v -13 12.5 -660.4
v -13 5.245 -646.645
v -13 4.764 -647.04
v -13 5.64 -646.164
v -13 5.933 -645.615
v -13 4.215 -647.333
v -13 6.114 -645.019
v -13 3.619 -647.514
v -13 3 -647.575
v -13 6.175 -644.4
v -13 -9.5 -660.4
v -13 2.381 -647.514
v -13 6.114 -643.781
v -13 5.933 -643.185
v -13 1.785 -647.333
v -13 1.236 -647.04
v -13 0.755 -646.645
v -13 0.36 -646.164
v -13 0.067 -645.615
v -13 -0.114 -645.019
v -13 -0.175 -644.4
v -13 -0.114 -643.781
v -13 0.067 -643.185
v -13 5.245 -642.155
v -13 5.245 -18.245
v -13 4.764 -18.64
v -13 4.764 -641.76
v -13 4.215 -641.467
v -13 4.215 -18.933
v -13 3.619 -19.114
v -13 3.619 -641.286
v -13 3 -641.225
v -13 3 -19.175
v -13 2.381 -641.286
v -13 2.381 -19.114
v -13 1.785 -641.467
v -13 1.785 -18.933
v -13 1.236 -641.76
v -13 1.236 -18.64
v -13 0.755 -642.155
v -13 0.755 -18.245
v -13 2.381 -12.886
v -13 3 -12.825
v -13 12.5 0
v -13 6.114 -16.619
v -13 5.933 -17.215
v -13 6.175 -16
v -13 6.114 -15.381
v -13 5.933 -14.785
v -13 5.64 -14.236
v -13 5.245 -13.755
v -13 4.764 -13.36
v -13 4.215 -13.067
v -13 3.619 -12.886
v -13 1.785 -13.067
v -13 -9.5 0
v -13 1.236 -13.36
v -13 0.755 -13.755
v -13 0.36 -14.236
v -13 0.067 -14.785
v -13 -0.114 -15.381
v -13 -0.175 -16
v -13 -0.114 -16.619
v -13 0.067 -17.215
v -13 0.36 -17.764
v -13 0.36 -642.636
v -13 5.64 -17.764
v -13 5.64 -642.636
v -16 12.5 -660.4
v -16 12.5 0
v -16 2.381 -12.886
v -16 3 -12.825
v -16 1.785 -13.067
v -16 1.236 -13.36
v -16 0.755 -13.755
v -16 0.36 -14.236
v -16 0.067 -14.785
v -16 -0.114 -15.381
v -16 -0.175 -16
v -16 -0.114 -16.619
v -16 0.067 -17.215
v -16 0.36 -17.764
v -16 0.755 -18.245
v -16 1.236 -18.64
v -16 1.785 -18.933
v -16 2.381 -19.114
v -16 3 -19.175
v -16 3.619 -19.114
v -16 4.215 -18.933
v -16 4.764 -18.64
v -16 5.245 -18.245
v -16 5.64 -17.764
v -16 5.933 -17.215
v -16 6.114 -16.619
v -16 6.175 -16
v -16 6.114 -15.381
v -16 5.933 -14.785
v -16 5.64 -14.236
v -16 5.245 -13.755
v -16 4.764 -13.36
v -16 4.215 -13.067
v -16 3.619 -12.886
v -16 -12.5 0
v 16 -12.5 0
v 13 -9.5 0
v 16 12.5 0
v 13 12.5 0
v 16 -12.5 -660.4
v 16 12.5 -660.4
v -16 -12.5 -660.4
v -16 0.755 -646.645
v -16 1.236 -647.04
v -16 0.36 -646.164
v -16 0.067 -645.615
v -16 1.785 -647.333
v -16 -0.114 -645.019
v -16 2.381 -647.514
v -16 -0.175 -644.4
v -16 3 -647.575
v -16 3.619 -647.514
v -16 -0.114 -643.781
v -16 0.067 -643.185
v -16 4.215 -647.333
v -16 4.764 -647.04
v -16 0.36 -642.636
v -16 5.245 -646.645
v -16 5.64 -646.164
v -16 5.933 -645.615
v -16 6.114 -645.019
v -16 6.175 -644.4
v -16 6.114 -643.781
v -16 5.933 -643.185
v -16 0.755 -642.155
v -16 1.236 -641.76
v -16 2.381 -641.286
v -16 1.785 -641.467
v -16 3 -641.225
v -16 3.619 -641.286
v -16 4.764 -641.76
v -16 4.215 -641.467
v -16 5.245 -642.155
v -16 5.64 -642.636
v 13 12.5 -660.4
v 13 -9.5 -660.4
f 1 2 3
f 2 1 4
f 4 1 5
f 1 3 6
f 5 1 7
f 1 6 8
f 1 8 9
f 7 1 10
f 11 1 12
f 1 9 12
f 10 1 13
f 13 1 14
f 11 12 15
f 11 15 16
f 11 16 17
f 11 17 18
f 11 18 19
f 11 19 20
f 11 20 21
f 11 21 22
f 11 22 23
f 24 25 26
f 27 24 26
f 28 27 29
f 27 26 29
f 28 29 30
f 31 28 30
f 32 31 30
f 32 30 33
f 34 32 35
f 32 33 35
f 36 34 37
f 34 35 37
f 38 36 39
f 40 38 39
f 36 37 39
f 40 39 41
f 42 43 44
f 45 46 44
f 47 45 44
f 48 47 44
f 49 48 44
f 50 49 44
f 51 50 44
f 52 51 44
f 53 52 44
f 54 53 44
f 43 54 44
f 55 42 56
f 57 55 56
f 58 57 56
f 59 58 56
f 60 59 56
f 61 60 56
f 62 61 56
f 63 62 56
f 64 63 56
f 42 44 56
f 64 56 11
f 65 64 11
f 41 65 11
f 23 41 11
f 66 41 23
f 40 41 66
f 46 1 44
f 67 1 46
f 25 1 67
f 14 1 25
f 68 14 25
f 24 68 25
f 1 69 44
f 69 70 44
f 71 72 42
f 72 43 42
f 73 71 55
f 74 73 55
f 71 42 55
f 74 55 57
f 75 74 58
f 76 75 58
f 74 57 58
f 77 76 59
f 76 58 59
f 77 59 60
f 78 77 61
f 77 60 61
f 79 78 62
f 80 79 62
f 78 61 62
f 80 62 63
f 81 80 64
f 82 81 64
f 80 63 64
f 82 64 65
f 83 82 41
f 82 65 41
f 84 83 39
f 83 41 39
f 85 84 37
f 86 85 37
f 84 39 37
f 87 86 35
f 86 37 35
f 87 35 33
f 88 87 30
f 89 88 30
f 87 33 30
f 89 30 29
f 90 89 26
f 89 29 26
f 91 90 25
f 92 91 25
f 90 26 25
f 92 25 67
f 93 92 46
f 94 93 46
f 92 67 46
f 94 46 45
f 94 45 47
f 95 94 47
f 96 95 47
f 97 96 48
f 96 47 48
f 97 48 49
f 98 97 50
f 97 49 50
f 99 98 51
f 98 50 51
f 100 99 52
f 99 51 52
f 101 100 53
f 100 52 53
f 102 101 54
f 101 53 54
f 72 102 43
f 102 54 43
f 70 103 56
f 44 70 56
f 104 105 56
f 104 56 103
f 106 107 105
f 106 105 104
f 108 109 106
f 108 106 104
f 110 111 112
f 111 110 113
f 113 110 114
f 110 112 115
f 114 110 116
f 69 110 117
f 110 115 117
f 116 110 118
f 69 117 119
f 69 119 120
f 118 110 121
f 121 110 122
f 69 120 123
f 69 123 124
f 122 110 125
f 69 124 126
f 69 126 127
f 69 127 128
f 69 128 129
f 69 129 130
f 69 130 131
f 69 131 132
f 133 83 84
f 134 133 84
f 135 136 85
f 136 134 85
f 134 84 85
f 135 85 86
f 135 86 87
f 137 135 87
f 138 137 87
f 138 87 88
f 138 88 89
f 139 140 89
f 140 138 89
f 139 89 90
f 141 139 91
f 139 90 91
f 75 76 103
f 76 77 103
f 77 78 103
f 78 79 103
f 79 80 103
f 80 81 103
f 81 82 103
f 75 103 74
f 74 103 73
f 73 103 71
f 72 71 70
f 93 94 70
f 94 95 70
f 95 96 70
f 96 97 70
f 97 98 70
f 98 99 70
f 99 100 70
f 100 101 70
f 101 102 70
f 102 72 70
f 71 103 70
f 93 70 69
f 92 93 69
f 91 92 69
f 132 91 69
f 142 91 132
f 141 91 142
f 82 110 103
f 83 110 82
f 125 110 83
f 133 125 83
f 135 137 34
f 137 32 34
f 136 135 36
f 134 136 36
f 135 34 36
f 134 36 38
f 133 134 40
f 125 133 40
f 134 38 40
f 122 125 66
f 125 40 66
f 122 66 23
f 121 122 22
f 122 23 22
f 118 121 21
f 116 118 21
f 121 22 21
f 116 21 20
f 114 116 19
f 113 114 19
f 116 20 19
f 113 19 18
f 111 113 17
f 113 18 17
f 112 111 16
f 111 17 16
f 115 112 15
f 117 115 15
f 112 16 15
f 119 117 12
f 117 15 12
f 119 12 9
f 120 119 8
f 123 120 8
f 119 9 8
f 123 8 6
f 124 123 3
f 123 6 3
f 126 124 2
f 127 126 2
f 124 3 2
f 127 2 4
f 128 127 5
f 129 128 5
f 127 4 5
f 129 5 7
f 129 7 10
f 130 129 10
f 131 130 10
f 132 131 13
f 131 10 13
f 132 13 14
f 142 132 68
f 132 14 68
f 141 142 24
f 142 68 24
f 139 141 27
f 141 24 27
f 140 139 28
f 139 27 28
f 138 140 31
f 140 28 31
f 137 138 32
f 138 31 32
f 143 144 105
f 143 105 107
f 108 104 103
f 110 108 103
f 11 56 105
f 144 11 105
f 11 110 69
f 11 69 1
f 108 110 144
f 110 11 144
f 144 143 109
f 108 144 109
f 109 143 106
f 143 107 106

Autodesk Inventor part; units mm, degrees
ref_plane "YZ Plane" through (0, 0, 0) normal (1, 0, 0) x (0, 1, 0)
ref_plane "XZ Plane" through (0, 0, 0) normal (0, 1, 0) x (-1, 0, 0)
ref_plane "XY Plane" through (0, 0, 0) normal (0, 0, 1) x (1, 0, 0)
sketch "Sketch1" plane through (0, 0, 0) normal (0, 0, 1) x (1, 0, 0)
  line L0 (-16, 12.5) -> (-13, 12.5)
  line L1 (-13, 12.5) -> (-13, -9.5)
  line L2 (-13, -9.5) -> (13, -9.5)
  line L3 (13, -9.5) -> (13, 12.5)
  line L4 (13, 12.5) -> (16, 12.5)
  line L5 (16, 12.5) -> (16, -12.5)
  line L6 (16, -12.5) -> (-16, -12.5)
  line L7 (-16, -12.5) -> (-16, 12.5)
  point P0 (0, 0)
  dimension "d0" = 3
  dimension "d2" = 3
  dimension "d3" = 25
  dimension "d4" = 32
  dimension "d5" = 16
  dimension "d7" = 12.5
  dimension "d8" = 3
  dimension "d74" = 25
extrude "Extrusion1" add sketch "Sketch1" against normal blind 660.4
sketch "Sketch6" plane through (-16, -12.5, 0) normal (-1, 0, 0) x (0, 0, 1)
  circle A0 centre (-37.4708, 12.3) radius 3.175
  circle A1 centre (-177.8, 12.3) radius 3.175
  circle A2 centre (-340.3166, 12.3) radius 3.175
  circle A3 centre (-644.4, 15.5) radius 3.175
  line L0 (0, 25) -> (-660.4, 25) projected
  line L1 (0, 3) -> (-660.4, 3) projected
  line L2 (-660.4, 0) -> (-660.4, 25) projected
  circle A4 centre (-16, 15.5) radius 3.175
  line L3 (0, 0) -> (0, 25) projected
  point P0 (0, 12.5)
  dimension "d89" = 6.35
  dimension "d92" = 16
  dimension "d93" = 6.35
  dimension "d94" = 16
  dimension "d103" = 12.5
hole "Hole3" at (-16, 3, -644.4) at (-16, 3, -16) direction (1, 0, 0) diameter 6.35 depth 3 tip angle 118
equation "\"d2\" = d0"
equation "\"d5\" = 0.5 * d4"
equation "\"d7\" = 0.5 * d3"
equation "\"d8\" = d0"
equation "\"d74\" = d3"
properties part number "26in C-Channel Right" material "Aluminum 6061"
